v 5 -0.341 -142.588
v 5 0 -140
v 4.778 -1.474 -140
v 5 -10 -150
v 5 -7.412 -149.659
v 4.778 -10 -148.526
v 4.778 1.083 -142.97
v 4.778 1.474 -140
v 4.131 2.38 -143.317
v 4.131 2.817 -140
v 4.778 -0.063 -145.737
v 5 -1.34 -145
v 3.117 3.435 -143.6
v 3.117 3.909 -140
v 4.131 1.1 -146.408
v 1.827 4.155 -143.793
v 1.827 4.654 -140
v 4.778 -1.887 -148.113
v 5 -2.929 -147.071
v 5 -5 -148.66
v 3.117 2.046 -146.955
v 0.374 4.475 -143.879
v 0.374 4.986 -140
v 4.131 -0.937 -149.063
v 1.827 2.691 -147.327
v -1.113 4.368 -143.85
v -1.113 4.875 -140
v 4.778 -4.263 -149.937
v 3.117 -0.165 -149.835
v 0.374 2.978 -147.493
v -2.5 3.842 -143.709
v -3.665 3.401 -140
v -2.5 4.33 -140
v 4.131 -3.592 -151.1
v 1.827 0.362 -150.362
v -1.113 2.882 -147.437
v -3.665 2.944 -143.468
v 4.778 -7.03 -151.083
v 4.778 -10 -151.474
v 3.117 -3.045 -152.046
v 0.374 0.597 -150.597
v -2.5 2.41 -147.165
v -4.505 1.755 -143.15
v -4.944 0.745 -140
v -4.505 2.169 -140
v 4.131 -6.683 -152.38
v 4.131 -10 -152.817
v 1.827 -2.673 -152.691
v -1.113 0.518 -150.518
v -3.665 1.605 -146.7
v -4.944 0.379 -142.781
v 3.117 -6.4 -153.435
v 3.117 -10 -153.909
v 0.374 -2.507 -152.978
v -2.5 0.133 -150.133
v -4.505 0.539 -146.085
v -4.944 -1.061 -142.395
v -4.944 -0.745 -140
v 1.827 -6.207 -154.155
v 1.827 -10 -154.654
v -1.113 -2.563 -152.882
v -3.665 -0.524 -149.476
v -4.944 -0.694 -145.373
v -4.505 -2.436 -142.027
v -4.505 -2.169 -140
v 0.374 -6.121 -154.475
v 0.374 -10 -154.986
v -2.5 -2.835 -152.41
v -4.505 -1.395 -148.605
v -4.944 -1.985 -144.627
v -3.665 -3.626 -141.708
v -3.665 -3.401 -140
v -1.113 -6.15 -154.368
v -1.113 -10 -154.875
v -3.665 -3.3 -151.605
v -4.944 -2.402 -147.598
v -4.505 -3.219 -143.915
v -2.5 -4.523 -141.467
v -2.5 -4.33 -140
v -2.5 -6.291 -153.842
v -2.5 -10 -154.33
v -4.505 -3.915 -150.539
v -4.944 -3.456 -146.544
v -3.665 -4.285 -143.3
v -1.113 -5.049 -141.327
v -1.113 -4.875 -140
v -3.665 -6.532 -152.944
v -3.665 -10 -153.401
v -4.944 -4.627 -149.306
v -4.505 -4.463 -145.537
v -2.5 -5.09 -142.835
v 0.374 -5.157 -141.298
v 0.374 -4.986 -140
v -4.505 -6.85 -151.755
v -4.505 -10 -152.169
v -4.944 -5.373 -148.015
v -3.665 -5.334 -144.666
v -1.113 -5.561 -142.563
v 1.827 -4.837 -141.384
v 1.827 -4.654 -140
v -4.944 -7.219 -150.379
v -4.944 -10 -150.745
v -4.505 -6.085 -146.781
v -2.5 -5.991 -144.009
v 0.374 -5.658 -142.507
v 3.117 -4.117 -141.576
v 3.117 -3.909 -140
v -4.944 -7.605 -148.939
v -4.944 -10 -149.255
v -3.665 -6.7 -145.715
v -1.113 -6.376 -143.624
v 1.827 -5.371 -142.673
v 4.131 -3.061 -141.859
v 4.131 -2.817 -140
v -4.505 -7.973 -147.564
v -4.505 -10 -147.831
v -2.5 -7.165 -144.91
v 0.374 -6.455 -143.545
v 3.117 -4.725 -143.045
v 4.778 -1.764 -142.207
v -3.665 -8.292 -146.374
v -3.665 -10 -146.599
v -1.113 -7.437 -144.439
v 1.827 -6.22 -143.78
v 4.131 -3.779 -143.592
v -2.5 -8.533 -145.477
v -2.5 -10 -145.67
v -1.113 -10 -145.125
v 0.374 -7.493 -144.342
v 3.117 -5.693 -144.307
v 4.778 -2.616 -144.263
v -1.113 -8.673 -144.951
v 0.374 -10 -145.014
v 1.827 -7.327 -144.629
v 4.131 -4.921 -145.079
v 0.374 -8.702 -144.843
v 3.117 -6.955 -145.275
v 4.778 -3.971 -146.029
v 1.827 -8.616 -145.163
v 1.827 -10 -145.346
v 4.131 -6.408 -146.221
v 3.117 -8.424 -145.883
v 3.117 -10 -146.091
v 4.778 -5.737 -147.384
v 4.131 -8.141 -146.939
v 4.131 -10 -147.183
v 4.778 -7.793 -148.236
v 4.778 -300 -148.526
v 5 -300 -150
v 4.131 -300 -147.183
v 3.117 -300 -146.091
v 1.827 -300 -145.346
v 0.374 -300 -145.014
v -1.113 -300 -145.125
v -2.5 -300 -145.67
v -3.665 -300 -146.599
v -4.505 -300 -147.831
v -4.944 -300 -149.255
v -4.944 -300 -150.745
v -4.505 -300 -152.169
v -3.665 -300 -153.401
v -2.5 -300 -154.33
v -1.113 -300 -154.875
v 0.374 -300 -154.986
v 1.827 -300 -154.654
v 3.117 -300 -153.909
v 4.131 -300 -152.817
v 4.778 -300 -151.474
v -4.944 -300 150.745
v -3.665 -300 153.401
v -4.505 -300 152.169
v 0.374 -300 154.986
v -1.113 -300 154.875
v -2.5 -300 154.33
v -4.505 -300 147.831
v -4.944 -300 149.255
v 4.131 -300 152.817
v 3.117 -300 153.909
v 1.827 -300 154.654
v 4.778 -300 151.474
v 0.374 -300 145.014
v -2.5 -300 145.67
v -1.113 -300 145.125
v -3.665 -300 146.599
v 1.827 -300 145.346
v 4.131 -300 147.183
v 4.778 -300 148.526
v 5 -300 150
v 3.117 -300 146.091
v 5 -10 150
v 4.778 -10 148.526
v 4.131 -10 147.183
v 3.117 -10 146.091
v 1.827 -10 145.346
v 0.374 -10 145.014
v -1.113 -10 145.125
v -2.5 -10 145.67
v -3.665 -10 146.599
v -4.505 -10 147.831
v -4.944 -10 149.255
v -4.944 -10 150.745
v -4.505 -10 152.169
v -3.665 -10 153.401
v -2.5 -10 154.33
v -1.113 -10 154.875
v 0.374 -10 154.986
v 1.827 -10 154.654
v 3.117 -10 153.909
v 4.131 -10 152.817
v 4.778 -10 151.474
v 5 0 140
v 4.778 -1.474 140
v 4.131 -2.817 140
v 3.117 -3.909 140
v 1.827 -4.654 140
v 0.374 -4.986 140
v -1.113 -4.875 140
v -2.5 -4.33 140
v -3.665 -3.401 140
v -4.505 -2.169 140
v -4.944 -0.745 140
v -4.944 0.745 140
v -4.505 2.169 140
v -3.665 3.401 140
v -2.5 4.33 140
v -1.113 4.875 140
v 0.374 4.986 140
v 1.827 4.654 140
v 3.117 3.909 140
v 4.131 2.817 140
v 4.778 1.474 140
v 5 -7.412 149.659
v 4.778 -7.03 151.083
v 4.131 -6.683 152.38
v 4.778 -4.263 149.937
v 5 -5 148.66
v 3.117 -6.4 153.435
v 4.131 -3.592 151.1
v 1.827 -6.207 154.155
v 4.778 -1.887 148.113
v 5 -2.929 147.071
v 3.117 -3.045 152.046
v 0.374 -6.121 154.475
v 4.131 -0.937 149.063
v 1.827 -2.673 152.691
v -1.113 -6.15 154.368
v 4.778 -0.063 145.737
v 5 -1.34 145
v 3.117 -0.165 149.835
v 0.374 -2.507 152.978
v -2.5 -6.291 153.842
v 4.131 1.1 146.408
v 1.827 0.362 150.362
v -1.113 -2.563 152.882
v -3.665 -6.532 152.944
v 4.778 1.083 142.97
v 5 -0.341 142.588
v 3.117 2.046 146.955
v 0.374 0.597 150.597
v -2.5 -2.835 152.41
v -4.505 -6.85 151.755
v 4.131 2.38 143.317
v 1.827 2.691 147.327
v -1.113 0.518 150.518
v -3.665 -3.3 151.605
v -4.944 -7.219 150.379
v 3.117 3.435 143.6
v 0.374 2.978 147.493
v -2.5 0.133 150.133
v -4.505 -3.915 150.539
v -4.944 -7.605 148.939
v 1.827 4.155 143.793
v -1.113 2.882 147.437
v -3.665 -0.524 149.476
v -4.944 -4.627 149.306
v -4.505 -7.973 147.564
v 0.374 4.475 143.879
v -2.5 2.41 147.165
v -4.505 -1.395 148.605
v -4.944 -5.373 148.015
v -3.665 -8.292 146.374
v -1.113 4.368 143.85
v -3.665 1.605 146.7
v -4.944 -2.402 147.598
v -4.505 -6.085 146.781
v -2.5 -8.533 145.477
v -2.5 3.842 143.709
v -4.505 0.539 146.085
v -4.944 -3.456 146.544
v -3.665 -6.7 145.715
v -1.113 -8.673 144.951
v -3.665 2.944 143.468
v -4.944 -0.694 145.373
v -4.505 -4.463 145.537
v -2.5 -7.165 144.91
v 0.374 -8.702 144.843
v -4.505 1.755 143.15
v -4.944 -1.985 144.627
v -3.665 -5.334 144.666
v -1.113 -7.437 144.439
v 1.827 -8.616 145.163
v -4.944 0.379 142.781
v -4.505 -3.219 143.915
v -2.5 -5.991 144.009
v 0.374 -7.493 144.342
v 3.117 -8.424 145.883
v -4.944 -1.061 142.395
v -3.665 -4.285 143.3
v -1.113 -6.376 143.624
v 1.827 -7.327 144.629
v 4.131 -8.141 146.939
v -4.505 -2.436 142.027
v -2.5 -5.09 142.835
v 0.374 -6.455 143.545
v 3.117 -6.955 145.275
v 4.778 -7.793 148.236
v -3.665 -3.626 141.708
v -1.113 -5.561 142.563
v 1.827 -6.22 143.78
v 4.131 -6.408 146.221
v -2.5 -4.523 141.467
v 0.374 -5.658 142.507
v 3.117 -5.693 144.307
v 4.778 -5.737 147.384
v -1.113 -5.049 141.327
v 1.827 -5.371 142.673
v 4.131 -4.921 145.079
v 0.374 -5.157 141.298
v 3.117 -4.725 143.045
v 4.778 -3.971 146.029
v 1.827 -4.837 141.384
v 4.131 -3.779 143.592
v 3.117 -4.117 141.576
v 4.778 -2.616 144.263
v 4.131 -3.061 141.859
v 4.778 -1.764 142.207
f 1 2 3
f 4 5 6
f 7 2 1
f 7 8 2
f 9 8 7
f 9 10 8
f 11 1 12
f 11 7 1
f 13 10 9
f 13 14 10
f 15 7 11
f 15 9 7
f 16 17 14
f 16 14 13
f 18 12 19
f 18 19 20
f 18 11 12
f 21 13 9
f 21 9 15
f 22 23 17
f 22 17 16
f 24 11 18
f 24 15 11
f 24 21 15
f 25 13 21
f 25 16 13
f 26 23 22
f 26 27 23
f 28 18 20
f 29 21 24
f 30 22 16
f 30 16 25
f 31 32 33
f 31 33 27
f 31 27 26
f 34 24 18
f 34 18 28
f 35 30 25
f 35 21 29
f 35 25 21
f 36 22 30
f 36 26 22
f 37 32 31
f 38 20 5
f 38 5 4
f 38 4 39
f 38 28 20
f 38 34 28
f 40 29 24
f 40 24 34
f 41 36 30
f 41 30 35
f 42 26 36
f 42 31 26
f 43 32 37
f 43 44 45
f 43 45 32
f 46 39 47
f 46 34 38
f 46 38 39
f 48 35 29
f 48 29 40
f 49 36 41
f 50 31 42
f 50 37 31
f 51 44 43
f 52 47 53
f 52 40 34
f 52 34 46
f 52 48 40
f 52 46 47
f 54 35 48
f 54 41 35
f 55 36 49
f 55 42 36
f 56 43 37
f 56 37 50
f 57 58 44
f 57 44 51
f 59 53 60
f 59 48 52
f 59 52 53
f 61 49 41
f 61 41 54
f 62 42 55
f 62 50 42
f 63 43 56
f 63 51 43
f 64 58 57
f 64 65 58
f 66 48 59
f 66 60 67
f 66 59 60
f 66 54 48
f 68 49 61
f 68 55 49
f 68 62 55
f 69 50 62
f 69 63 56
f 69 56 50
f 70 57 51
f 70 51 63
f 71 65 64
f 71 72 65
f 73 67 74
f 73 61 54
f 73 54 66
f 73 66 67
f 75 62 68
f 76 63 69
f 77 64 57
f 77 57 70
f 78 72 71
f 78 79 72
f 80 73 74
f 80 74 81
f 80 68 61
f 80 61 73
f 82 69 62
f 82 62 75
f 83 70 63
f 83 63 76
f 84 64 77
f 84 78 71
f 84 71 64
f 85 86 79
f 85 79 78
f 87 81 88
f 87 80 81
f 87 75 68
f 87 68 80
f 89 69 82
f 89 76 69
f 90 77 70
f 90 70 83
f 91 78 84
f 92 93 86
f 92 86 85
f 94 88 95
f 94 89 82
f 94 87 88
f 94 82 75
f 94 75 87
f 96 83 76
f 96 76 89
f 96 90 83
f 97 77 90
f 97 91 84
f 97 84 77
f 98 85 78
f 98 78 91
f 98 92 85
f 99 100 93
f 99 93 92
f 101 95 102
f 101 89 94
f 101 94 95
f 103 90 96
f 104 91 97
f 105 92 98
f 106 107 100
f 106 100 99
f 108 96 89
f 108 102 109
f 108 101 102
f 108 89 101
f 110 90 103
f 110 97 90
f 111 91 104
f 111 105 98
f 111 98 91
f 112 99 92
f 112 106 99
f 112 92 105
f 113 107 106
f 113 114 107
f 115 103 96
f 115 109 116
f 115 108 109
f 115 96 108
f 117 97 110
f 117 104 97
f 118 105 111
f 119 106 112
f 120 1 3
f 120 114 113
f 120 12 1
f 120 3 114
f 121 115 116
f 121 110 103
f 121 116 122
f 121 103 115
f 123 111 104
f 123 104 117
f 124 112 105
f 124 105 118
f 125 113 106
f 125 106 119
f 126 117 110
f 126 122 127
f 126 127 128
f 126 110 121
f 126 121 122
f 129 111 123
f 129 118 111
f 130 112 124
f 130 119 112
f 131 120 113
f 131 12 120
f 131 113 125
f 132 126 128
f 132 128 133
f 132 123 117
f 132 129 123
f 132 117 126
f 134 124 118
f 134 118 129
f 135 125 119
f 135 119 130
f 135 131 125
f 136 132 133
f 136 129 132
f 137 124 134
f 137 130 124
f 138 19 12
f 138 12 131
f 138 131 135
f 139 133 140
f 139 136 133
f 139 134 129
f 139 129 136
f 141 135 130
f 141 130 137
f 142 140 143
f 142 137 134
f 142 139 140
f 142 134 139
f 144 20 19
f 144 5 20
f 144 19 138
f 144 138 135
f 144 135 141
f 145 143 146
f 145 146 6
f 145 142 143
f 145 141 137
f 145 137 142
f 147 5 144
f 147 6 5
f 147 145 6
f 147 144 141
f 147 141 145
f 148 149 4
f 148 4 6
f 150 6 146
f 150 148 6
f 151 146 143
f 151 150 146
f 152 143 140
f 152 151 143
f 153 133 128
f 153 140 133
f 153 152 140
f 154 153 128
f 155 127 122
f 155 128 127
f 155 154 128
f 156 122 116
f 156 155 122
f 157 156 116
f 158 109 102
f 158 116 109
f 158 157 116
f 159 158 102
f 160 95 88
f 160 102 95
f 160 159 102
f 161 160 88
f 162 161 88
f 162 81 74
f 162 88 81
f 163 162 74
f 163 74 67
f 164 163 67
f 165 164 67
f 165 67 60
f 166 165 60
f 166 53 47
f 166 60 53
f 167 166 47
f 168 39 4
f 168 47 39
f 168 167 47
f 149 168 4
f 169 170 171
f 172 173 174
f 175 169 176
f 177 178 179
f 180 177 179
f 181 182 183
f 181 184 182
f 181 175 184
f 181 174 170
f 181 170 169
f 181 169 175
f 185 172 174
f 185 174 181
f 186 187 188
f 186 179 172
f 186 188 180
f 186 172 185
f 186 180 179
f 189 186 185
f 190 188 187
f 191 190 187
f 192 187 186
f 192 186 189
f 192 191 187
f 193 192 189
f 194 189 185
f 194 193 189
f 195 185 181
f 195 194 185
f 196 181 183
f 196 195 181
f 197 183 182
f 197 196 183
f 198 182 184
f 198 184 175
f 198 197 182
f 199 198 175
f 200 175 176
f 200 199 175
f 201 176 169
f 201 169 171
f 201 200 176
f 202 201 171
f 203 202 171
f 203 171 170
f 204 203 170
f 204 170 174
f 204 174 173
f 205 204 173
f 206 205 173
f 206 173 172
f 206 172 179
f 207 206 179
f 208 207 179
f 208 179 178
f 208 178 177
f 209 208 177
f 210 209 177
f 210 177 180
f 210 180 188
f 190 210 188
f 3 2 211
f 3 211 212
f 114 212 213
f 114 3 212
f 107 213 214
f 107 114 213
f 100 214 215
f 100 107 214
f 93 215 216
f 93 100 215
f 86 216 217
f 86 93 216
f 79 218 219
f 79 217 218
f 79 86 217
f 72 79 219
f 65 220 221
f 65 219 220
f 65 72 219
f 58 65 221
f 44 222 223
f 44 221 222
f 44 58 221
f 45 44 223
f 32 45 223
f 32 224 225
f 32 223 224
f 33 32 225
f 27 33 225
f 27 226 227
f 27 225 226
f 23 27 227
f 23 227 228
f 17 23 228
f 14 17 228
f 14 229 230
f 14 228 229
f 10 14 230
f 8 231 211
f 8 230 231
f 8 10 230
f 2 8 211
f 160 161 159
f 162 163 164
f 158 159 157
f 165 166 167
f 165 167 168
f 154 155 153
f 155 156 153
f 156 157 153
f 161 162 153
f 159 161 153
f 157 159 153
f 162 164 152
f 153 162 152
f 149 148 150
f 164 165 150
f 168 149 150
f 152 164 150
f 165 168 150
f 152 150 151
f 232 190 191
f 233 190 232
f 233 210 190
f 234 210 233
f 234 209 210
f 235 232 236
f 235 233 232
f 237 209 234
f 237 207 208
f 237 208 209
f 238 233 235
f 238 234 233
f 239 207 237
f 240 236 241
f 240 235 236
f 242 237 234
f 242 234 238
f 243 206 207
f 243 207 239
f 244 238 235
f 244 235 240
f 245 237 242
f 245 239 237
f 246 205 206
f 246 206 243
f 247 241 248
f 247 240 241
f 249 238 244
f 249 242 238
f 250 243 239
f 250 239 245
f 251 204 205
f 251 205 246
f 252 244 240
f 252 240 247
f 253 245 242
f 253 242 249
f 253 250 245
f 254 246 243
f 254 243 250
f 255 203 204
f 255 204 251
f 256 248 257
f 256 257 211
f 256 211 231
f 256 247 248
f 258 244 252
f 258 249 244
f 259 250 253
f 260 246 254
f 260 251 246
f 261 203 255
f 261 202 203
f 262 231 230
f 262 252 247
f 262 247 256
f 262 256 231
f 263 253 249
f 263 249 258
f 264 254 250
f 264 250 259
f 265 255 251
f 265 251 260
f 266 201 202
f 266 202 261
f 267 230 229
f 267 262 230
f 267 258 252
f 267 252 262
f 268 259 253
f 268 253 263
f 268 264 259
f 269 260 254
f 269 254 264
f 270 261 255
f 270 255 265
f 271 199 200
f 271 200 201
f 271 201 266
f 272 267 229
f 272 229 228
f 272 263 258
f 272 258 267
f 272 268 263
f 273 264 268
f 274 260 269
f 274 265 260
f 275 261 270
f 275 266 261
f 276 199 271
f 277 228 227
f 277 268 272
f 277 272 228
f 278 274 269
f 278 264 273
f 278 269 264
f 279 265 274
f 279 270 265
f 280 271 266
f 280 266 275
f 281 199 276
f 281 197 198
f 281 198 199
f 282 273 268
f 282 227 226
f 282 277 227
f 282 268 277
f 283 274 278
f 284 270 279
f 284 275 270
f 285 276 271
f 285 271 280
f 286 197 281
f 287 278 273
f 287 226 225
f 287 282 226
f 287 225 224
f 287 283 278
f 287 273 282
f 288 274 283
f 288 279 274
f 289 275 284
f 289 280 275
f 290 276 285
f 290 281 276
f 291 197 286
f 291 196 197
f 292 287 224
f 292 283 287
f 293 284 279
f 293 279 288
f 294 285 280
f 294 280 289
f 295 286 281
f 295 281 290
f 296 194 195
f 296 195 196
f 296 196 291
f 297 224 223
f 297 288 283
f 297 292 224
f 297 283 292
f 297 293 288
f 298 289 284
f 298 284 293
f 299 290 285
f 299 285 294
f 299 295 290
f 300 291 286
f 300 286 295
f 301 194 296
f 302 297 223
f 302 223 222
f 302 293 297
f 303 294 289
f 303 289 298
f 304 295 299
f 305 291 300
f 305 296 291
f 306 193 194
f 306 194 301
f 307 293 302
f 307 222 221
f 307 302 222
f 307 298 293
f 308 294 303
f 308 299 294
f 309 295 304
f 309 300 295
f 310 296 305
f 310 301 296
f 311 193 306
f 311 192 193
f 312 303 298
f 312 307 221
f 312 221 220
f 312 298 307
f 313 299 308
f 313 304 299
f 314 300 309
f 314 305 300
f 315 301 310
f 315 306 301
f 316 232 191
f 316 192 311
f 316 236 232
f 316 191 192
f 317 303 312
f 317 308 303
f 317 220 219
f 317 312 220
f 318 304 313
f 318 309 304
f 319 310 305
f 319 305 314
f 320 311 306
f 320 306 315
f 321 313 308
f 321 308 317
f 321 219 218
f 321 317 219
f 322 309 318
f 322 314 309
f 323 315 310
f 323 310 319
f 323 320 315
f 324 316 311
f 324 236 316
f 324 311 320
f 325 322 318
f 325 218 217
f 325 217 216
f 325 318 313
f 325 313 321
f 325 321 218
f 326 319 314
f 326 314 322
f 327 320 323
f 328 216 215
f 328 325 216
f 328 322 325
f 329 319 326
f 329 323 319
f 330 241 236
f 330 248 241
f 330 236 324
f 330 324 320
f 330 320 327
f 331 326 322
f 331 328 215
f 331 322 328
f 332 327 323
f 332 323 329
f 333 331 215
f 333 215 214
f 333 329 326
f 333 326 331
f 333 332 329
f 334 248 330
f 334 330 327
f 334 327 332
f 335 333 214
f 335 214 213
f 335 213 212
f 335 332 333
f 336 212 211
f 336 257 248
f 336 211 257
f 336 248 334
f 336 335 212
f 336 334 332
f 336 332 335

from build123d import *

# Parameters (mm, degrees)
ESQUISSE1_R = 5


with BuildPart() as part:
    # Balayage1: sweep along a path in Esquisse2
    with BuildLine(Plane(origin=(0, 0, 0), x_dir=(0, 0, -1), z_dir=(1, 0, 0))) as balayage1_path:
        Line((-150, -300), (-150, -10))
        ThreePointArc((-150, -10), (-147.071067812, -2.928932188), (-140, 0))
        Line((-140, 0), (140, 0))
        ThreePointArc((140, 0), (147.071067812, -2.928932188), (150, -10))
        Line((150, -10), (150, -300))
    # Esquisse1 → Balayage1 (sweep)
    with BuildSketch(Plane.XY):
        Circle(ESQUISSE1_R)
    sweep(path=balayage1_path.line)


solid = part.part
